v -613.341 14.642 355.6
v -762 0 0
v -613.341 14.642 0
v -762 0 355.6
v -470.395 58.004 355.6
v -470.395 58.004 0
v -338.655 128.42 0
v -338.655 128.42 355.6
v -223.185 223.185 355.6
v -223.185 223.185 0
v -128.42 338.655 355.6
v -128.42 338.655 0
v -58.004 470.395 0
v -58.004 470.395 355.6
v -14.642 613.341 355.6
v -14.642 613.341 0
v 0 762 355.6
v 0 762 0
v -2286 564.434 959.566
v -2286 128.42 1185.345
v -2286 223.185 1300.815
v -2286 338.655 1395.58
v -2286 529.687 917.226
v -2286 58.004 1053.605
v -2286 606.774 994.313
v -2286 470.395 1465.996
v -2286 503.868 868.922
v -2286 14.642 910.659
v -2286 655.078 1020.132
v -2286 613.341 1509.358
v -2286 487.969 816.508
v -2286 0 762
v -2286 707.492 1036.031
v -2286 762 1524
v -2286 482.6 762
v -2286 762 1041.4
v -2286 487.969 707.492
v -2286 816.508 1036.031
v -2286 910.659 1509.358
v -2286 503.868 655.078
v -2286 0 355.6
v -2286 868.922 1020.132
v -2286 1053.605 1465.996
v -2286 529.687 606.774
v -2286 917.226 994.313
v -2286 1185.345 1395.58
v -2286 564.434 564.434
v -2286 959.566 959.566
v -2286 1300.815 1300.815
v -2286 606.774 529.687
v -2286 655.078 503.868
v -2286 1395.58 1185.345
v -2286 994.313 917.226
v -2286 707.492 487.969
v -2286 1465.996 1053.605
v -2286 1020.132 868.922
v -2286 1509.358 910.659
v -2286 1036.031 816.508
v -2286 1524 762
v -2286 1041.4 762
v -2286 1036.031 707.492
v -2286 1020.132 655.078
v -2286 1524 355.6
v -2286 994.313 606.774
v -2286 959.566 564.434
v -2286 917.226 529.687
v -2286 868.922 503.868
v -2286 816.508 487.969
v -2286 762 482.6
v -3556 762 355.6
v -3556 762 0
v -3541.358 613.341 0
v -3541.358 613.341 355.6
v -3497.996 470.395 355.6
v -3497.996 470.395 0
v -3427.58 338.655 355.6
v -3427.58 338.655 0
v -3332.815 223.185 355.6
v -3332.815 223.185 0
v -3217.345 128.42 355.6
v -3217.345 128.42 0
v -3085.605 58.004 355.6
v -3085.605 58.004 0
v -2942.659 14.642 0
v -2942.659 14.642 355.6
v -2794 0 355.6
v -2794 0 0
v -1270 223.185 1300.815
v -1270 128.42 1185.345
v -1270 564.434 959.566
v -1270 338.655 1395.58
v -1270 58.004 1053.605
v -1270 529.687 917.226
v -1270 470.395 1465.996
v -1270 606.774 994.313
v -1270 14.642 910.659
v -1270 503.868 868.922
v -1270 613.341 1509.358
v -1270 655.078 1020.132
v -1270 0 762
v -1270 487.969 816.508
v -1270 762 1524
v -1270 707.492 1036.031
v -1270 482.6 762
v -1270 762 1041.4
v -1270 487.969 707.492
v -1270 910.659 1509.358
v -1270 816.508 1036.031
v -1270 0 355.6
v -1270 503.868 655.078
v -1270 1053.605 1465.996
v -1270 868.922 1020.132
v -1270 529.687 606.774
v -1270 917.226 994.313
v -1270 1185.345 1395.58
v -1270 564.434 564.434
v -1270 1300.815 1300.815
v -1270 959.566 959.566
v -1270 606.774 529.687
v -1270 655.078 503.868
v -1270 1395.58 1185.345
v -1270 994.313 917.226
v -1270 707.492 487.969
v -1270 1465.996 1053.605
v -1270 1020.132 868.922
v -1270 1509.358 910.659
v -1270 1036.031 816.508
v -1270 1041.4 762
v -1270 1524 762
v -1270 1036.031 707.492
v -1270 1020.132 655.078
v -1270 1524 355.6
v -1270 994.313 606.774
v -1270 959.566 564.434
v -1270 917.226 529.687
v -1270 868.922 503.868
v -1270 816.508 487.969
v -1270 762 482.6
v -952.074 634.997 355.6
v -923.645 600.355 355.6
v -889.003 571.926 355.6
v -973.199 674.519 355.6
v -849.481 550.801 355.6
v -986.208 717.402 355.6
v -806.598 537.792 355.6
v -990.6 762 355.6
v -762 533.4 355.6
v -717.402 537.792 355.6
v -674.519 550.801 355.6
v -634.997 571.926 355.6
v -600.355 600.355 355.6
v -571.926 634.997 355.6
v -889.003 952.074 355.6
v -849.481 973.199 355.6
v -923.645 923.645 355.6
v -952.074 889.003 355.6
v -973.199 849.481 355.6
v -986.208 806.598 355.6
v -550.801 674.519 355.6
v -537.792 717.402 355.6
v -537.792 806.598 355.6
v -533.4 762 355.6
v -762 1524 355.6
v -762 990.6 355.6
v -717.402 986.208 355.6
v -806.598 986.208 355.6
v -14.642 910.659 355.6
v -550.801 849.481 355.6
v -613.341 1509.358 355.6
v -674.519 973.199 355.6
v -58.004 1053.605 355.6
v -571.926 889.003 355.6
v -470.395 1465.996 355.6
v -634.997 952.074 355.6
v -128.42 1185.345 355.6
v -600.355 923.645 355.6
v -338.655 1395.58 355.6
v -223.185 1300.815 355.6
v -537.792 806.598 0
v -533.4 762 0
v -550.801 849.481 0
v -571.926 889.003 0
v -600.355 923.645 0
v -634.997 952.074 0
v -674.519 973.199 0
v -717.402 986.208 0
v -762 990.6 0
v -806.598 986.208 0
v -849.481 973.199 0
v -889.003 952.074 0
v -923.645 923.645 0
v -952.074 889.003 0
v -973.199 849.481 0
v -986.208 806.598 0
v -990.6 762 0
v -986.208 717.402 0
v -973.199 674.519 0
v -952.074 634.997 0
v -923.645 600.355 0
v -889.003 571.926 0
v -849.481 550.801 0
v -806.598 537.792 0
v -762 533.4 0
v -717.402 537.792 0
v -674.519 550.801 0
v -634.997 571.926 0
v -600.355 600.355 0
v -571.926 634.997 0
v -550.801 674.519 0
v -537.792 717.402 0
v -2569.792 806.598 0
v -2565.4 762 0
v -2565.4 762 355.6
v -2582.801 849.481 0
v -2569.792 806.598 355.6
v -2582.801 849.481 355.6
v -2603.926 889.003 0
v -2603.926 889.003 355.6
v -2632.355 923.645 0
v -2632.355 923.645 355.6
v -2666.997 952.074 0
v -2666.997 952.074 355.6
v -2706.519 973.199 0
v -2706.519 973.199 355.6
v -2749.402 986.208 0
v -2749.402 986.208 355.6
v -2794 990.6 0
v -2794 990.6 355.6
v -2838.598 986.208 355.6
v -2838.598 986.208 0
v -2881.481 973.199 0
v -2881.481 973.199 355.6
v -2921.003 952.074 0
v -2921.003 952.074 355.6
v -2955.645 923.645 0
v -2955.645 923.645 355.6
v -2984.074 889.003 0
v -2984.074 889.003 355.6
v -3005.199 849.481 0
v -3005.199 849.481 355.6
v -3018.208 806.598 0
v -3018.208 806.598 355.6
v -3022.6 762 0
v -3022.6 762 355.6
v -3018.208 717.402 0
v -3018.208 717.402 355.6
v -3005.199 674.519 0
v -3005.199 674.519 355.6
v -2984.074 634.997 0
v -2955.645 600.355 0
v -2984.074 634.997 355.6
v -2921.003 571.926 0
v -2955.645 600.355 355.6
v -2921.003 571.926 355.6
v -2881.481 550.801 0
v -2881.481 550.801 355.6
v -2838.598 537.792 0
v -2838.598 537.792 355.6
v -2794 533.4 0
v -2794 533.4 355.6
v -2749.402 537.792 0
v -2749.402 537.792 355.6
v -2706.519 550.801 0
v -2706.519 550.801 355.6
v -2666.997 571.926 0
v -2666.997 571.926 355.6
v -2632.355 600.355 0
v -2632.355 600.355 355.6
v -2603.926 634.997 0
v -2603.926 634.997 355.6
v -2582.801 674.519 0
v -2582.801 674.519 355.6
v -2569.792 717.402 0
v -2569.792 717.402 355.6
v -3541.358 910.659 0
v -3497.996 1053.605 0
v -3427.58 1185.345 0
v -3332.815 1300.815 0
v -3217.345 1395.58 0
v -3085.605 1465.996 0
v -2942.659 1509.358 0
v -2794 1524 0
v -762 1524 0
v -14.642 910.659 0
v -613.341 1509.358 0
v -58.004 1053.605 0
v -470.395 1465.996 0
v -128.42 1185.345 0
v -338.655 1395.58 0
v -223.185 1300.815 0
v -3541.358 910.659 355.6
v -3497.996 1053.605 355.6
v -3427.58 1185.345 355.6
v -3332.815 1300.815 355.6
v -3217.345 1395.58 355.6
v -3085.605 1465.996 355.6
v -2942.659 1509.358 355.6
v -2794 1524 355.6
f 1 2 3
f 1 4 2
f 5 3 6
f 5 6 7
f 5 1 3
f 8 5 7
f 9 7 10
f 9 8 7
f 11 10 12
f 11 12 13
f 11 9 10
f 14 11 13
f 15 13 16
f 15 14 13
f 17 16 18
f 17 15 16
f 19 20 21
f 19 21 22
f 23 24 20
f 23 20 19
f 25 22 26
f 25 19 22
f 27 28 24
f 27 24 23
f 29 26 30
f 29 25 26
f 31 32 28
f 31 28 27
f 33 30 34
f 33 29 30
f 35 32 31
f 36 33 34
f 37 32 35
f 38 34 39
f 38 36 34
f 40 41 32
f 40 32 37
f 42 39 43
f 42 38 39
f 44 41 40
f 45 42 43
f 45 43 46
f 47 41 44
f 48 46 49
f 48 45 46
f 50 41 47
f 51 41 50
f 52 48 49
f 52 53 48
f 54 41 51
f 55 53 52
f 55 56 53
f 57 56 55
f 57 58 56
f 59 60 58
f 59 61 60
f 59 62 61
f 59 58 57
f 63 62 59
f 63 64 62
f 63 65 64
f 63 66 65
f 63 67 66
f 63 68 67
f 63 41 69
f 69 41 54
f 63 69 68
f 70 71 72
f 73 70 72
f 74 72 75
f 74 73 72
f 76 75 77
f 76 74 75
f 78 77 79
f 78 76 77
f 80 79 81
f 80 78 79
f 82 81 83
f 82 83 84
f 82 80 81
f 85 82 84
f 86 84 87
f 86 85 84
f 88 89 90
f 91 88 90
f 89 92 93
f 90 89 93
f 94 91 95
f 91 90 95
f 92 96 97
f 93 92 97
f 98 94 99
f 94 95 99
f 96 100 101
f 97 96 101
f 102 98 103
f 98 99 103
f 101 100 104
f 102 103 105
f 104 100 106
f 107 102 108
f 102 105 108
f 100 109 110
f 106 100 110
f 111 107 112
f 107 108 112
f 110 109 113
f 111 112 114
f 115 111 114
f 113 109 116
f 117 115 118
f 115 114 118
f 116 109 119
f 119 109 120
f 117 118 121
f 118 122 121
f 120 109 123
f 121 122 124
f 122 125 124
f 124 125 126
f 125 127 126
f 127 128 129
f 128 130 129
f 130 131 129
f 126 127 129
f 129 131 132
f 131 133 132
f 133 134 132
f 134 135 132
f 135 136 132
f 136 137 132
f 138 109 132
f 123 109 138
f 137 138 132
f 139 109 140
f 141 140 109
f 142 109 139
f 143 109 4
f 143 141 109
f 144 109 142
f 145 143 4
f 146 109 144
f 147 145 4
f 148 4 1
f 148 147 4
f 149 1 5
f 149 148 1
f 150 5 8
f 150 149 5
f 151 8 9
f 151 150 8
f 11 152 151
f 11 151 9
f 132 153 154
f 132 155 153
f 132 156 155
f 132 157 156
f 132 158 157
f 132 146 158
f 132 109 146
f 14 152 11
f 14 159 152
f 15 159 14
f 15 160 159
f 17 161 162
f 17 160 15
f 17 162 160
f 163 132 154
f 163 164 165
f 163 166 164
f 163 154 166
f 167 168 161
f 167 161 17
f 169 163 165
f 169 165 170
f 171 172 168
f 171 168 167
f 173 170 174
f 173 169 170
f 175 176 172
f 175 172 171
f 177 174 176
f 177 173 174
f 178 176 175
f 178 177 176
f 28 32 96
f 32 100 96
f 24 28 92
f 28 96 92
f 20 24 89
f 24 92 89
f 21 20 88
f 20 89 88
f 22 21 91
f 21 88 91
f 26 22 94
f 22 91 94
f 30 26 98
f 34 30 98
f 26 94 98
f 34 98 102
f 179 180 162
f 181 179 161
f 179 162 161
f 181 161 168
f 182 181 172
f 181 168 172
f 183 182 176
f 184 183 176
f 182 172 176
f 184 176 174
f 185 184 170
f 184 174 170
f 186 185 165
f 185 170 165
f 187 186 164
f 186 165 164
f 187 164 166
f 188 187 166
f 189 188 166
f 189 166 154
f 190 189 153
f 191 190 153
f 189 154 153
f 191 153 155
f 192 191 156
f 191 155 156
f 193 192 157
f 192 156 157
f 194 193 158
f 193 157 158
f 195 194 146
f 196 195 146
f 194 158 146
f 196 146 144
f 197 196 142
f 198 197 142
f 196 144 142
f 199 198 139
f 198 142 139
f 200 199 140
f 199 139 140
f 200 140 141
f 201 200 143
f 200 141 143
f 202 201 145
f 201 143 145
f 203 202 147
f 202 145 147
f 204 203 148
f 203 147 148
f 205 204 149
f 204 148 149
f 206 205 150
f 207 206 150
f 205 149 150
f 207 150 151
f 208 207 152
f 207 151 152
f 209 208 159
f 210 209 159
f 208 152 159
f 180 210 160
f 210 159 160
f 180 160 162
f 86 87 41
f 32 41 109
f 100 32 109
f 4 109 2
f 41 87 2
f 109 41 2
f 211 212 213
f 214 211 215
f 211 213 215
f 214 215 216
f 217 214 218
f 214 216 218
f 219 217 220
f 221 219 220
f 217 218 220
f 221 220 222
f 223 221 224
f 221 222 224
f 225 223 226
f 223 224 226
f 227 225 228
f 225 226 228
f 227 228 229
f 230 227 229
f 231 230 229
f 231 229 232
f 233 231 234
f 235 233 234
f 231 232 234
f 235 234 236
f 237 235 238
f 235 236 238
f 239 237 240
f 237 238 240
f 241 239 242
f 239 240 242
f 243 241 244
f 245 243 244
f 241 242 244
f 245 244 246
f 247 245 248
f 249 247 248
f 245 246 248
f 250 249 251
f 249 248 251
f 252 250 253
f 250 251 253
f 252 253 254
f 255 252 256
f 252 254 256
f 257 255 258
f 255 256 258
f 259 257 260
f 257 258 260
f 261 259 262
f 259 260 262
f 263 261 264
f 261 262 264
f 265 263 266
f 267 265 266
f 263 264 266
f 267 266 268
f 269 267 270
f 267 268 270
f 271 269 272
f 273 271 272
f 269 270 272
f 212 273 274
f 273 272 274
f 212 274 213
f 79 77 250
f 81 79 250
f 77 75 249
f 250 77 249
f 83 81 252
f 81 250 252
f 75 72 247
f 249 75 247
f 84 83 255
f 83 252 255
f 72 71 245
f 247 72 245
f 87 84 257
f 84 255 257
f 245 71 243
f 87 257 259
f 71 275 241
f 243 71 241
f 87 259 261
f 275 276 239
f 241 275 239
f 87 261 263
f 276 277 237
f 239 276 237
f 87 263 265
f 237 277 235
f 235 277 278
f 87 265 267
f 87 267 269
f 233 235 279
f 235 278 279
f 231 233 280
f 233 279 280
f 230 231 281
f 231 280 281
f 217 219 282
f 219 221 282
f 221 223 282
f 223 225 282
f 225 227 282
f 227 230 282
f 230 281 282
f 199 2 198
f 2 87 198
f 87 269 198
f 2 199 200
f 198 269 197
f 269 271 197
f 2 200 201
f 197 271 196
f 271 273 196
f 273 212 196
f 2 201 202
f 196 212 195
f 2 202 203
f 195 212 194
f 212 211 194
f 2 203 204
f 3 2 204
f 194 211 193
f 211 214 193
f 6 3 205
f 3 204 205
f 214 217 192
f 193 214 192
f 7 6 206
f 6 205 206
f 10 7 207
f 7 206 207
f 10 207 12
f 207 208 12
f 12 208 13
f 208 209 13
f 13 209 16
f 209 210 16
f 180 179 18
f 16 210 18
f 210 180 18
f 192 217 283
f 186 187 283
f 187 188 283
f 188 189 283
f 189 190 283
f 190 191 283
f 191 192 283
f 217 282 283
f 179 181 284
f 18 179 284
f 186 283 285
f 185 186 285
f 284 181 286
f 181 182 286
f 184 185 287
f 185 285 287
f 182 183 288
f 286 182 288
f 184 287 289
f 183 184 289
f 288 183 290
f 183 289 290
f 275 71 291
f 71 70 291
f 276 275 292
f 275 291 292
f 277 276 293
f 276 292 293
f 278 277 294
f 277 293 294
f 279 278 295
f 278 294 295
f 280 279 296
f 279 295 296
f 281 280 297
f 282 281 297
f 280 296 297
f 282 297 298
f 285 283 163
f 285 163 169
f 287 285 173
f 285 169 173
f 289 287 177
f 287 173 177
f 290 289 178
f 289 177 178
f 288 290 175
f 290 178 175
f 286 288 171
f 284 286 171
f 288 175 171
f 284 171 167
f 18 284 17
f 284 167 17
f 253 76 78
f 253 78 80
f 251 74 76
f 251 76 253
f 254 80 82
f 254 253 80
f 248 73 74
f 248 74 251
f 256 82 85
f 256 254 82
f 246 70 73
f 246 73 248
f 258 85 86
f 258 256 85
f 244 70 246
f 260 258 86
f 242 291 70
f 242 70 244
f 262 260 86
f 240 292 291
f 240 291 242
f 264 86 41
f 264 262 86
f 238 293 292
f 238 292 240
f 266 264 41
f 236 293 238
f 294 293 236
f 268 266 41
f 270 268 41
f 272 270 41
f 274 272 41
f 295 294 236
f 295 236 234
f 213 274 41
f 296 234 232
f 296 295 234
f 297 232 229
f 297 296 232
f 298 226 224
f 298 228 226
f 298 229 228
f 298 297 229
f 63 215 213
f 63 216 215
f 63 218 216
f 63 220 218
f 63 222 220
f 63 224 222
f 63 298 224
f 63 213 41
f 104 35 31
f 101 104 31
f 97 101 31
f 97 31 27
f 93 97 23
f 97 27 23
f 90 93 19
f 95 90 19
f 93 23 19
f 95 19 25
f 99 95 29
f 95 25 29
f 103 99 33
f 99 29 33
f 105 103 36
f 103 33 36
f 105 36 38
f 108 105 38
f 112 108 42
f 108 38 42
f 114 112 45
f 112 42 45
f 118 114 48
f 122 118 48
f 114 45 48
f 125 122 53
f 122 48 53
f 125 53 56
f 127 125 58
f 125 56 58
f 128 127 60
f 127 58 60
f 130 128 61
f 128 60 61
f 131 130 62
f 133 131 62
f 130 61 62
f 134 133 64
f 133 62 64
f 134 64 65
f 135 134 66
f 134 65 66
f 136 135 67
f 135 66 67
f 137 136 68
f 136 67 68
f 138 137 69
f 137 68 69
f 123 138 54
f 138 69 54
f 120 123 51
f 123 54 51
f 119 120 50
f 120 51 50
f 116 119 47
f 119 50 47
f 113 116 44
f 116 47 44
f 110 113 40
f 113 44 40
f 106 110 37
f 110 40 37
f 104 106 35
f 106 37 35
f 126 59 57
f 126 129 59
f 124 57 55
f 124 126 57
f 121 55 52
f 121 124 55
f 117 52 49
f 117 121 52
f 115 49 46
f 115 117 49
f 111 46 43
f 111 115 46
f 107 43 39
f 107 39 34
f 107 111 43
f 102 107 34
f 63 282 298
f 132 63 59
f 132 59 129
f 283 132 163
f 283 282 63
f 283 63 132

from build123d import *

# Parameters (mm, degrees)
F0_W      = 3556
F0_H      = 1524
F1_DEPTH  = 355.6
F2_W      = 1016
F2_H      = 1524
F3_DEPTH  = 1168.4
F4_R      = 761.99999
F5_R      = 279.4
F6_DEPTH  = 1016
F7_R      = 228.6
F8_DEPTH  = 355.6
F9_R      = 228.6
F10_DEPTH = 355.6


# Not quite as in the source:
# - a fillet or chamfer is up to 0.001 mm smaller than in the source, because OpenCascade refuses the exact size


with BuildPart() as f1:
    # F0 (on Top) → F1 (new body)
    with BuildSketch(Plane.XY):
        with Locations((-1778, 762)):
            Rectangle(F0_W, F0_H)
    extrude(amount=F1_DEPTH)

    # F2 (on face) → F3 (join)
    with BuildSketch(Plane.XY.offset(355.6)):
        with Locations((-1778, 762)):
            Rectangle(F2_W, F2_H)
    extrude(amount=F3_DEPTH)

    # F4 (radius 762 in the source; OpenCascade refuses exactly that, so slightly less here)
    f4_edges = [f1.edges().sort_by_distance(p)[0] for p in [
        (-1778, 0, 1524),
        (0, 0, 177.8),
        (0, 1524, 177.8),
        (-3556, 0, 177.8),
        (-3556, 1524, 177.8),
        (-1778, 1524, 1524),
    ]]
    fillet(f4_edges, radius=F4_R)

    # F5 (on face) → F6 (cut)
    with BuildSketch(Plane(origin=(-2286, 0, 0), x_dir=(0, -1, 0), z_dir=(-1, 0, 0))):
        with Locations((-762, 762)):
            Circle(F5_R)
    extrude(amount=-F6_DEPTH, mode=Mode.SUBTRACT)

    # F7 (on face) → F8 (cut)
    with BuildSketch(Plane.XY.offset(355.6)):
        with Locations((-762, 762)):
            Circle(F7_R)
    extrude(amount=-F8_DEPTH, mode=Mode.SUBTRACT)

    # F9 (on face) → F10 (cut)
    with BuildSketch(Plane.XY.offset(355.6)):
        with Locations((-2794, 762)):
            Circle(F9_R)
    extrude(amount=-F10_DEPTH, mode=Mode.SUBTRACT)


solid = f1.part
